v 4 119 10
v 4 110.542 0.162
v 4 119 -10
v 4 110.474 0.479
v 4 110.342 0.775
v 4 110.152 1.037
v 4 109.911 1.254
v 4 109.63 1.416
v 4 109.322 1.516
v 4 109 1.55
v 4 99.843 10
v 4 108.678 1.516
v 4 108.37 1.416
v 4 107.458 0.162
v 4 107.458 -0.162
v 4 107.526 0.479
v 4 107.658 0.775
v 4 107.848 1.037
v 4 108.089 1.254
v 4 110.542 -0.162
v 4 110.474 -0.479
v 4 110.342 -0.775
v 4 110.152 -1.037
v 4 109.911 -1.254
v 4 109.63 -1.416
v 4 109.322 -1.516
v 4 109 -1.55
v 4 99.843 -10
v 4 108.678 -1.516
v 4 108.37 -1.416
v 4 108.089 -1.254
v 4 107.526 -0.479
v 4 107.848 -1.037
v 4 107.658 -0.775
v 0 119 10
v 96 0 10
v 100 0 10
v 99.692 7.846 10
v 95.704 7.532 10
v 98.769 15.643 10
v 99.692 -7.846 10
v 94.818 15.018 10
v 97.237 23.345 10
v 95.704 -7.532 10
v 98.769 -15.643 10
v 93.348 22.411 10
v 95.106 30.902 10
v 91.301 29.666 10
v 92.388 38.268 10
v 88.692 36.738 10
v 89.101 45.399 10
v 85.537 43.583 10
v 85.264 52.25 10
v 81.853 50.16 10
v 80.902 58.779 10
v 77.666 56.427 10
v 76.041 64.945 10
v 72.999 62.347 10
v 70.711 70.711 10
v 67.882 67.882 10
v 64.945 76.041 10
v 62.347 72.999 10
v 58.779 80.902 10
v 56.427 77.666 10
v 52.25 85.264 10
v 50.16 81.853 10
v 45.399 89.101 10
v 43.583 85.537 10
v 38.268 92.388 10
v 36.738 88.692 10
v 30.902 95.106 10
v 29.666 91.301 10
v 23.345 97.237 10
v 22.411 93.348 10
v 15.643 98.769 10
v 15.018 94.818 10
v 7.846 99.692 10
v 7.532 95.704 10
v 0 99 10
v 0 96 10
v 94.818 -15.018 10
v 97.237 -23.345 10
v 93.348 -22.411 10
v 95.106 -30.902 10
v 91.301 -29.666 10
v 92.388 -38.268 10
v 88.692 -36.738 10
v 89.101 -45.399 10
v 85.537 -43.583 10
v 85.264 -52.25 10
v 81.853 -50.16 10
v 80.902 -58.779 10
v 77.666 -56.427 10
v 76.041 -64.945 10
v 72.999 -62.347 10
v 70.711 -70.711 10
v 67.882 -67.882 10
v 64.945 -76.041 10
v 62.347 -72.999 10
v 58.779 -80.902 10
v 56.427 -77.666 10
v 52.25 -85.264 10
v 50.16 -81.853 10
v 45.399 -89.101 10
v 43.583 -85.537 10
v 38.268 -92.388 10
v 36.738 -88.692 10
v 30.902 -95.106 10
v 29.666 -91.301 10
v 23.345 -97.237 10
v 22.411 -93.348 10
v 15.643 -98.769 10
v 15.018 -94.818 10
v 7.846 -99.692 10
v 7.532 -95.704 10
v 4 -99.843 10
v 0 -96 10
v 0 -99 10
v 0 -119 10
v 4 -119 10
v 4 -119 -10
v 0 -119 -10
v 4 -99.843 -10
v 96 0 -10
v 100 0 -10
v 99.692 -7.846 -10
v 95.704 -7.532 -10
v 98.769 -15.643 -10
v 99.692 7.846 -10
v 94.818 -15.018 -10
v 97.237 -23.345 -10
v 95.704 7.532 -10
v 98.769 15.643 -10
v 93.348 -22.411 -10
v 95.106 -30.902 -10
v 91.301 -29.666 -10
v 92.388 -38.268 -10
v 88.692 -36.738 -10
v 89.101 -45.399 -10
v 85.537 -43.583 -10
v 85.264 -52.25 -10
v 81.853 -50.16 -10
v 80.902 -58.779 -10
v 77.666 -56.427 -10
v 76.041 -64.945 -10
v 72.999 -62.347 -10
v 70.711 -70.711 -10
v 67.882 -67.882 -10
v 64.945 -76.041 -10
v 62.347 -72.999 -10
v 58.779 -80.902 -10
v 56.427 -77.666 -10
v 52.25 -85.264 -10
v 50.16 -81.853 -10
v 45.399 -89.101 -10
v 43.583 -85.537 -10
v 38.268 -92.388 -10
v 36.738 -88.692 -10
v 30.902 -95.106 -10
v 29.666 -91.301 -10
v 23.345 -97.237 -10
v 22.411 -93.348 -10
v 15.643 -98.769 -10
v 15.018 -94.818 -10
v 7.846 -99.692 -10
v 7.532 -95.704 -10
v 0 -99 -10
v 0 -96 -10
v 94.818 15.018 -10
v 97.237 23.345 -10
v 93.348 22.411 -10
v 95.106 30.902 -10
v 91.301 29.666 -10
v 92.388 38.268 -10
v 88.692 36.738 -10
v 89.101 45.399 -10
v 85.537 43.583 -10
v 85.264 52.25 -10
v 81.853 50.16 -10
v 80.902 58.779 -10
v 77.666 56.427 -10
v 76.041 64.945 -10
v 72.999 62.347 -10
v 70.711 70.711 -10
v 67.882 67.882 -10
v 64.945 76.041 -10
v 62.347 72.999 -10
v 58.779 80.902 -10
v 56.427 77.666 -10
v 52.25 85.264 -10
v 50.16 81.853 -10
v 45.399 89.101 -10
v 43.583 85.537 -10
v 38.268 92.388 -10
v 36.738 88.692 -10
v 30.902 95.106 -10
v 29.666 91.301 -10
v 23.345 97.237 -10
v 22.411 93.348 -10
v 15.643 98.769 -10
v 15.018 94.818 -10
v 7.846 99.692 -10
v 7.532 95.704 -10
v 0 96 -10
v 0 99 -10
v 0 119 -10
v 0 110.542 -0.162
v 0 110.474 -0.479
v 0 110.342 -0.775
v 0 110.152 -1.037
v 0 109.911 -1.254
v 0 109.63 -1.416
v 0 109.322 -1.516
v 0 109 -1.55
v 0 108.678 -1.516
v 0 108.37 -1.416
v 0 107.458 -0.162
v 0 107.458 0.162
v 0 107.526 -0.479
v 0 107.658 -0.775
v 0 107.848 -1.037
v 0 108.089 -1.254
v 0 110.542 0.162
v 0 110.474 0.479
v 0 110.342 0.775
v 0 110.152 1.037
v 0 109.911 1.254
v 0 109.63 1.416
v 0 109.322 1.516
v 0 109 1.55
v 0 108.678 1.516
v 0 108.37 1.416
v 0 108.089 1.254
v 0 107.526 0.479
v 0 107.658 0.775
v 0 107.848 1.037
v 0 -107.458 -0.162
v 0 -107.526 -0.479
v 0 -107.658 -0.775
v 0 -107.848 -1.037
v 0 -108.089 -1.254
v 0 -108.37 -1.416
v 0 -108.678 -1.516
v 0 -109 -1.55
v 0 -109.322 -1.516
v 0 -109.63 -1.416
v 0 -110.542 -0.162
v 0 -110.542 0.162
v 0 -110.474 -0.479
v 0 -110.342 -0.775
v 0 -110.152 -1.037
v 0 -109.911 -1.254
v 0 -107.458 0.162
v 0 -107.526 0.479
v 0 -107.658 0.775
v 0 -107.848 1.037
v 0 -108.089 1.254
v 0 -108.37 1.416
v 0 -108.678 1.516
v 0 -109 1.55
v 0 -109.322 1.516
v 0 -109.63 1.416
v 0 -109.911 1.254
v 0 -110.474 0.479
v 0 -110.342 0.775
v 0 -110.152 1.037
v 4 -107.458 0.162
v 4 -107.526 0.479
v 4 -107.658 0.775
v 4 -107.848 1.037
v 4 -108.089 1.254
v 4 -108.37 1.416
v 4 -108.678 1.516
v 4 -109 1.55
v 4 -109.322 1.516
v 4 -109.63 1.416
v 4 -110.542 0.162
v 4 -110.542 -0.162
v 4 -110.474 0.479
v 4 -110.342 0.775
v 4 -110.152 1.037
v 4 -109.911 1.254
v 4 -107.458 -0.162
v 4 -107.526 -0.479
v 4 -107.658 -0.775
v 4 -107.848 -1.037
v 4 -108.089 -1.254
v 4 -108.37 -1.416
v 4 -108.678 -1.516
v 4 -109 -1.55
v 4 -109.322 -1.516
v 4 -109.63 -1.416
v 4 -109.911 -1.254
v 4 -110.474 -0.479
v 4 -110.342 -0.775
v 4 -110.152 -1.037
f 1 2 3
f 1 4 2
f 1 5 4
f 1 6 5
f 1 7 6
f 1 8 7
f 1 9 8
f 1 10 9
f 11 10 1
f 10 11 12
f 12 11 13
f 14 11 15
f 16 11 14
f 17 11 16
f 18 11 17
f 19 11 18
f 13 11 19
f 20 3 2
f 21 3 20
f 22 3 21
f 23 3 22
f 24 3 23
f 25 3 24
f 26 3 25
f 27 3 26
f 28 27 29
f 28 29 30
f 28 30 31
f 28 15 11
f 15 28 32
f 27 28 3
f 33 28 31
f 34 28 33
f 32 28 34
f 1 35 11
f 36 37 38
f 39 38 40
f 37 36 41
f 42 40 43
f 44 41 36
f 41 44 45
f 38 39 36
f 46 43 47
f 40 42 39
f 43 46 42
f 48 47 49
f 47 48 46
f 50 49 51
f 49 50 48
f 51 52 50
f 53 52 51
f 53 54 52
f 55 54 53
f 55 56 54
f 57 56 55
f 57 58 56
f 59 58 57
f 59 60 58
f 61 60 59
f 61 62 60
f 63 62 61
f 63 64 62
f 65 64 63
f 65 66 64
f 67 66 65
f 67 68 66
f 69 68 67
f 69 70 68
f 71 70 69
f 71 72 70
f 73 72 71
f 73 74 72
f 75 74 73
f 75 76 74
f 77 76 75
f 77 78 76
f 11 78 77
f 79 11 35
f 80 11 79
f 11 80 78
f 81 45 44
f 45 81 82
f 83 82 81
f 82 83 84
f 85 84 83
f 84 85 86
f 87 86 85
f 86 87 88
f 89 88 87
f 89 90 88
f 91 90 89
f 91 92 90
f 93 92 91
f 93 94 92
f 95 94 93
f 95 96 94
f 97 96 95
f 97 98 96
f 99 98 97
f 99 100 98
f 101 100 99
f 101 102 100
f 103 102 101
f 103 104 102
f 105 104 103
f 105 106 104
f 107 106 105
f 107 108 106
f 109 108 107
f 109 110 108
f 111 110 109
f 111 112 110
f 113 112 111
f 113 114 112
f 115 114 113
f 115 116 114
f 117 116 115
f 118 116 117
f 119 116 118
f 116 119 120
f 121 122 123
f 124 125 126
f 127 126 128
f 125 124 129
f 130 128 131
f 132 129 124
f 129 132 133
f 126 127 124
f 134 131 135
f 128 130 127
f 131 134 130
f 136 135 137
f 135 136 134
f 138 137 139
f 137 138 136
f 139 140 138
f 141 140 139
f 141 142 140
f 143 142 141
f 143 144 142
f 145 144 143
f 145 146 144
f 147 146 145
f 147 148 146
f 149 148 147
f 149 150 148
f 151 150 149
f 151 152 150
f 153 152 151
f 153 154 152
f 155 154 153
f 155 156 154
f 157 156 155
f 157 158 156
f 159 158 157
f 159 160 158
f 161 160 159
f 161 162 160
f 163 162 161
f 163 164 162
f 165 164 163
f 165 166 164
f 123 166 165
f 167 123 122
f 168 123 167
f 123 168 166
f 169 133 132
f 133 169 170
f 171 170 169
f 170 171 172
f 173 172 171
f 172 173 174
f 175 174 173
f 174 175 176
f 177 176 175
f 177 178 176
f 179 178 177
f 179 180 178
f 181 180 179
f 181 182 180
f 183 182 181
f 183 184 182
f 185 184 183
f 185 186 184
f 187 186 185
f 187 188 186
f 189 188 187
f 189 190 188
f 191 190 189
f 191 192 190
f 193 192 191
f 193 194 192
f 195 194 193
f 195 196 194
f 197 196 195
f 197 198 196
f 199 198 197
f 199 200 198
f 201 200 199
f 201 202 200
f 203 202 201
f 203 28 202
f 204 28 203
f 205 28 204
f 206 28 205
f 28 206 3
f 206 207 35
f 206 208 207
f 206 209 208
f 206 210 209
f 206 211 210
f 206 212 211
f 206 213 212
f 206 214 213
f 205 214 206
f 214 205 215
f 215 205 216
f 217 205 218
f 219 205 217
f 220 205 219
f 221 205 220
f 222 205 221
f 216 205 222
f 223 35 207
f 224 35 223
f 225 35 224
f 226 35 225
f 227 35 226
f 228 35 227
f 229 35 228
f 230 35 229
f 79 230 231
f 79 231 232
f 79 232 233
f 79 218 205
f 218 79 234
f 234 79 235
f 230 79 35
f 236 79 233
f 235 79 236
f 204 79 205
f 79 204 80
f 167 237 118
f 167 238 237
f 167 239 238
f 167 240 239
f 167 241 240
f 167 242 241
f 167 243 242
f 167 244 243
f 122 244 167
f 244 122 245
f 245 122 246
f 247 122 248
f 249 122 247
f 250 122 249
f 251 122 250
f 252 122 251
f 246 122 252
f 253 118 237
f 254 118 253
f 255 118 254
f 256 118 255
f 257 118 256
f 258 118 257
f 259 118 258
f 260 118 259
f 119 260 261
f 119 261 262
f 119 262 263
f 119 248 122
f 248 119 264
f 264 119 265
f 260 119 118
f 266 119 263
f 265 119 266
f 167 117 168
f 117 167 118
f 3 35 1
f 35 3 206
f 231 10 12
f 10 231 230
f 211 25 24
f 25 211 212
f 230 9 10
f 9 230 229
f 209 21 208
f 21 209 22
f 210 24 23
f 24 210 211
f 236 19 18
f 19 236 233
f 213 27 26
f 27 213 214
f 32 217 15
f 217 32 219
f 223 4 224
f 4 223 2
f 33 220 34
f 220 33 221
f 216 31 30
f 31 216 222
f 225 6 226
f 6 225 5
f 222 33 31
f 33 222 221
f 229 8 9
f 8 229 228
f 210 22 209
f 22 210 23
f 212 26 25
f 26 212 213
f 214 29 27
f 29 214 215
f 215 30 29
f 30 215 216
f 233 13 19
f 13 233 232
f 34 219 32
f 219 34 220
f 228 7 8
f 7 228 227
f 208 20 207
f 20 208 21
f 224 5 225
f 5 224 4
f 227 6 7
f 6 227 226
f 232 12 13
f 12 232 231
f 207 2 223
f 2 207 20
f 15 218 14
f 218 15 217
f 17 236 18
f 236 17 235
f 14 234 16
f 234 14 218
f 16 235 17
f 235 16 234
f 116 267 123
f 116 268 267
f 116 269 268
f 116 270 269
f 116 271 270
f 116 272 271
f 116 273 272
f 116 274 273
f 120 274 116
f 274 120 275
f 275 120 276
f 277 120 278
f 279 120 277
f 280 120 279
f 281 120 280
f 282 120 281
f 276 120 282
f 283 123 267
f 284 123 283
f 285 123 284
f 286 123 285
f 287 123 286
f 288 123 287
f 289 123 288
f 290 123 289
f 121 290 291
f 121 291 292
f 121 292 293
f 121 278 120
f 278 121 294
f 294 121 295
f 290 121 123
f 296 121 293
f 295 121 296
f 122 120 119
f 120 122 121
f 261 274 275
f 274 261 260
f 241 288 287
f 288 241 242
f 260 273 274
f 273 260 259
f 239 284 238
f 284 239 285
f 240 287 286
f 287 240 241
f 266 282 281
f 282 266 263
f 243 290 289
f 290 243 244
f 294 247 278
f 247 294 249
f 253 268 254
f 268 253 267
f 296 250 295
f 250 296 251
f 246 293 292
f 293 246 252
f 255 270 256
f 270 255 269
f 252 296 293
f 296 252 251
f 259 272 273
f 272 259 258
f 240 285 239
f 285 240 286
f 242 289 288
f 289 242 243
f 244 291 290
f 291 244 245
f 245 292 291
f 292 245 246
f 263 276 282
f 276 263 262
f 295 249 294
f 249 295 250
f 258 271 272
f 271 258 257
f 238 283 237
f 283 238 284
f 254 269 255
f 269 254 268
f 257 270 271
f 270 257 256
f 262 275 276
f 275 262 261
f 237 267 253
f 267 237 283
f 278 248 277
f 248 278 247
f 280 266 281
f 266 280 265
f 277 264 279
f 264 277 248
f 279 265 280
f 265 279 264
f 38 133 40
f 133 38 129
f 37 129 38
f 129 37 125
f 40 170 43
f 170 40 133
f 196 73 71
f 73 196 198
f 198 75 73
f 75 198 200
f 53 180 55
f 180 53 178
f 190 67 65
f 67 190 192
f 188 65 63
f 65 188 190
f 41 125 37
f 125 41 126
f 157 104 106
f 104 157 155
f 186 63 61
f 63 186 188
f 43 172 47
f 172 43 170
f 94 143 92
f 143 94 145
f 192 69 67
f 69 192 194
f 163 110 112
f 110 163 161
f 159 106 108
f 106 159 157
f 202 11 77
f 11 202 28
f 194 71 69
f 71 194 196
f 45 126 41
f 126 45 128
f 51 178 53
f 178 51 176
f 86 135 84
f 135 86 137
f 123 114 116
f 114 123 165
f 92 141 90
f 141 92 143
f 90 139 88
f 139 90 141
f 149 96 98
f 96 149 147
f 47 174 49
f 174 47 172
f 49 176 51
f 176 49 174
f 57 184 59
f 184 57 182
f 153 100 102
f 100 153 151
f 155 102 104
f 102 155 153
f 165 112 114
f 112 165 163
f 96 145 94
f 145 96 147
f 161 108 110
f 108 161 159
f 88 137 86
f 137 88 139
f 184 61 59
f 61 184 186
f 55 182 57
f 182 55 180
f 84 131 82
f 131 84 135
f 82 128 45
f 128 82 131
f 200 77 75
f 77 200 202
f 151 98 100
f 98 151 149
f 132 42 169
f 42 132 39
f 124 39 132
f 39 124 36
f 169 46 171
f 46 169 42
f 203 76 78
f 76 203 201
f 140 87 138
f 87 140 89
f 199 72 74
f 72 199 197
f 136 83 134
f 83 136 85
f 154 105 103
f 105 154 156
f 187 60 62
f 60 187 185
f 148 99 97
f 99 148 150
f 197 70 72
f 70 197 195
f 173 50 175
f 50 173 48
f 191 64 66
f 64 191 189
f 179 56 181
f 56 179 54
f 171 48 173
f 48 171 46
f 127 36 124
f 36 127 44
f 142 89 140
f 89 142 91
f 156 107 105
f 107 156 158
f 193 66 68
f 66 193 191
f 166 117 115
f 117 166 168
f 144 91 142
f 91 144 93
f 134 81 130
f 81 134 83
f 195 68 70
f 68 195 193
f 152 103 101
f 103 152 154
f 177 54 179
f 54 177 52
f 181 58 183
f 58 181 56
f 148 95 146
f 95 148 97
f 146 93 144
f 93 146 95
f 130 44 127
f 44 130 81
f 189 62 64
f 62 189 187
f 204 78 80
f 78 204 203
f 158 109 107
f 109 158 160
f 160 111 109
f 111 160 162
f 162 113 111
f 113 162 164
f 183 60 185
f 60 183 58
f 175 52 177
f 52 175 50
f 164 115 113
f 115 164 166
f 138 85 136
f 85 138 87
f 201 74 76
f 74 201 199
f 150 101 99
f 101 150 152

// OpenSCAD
breite = 20;
durchmesser = 100;

translate([2,durchmesser+9,0]) lasche();
translate([2,-durchmesser+-9,0]) lasche();

module lasche() {
    difference(){
        cube([4,20,breite],center=true);
        rotate([0,90,0]) cylinder(r=3.1/2,h=10,$fn=30,center=true);
    }
}

difference() {
    cylinder(h=breite,r=durchmesser,$fn=80,center=true);
    cylinder(h=breite+1,r=durchmesser-4,$fn=80,center=true);
    translate([-300,-200,-20])
        cube([300,400,100]);
}
